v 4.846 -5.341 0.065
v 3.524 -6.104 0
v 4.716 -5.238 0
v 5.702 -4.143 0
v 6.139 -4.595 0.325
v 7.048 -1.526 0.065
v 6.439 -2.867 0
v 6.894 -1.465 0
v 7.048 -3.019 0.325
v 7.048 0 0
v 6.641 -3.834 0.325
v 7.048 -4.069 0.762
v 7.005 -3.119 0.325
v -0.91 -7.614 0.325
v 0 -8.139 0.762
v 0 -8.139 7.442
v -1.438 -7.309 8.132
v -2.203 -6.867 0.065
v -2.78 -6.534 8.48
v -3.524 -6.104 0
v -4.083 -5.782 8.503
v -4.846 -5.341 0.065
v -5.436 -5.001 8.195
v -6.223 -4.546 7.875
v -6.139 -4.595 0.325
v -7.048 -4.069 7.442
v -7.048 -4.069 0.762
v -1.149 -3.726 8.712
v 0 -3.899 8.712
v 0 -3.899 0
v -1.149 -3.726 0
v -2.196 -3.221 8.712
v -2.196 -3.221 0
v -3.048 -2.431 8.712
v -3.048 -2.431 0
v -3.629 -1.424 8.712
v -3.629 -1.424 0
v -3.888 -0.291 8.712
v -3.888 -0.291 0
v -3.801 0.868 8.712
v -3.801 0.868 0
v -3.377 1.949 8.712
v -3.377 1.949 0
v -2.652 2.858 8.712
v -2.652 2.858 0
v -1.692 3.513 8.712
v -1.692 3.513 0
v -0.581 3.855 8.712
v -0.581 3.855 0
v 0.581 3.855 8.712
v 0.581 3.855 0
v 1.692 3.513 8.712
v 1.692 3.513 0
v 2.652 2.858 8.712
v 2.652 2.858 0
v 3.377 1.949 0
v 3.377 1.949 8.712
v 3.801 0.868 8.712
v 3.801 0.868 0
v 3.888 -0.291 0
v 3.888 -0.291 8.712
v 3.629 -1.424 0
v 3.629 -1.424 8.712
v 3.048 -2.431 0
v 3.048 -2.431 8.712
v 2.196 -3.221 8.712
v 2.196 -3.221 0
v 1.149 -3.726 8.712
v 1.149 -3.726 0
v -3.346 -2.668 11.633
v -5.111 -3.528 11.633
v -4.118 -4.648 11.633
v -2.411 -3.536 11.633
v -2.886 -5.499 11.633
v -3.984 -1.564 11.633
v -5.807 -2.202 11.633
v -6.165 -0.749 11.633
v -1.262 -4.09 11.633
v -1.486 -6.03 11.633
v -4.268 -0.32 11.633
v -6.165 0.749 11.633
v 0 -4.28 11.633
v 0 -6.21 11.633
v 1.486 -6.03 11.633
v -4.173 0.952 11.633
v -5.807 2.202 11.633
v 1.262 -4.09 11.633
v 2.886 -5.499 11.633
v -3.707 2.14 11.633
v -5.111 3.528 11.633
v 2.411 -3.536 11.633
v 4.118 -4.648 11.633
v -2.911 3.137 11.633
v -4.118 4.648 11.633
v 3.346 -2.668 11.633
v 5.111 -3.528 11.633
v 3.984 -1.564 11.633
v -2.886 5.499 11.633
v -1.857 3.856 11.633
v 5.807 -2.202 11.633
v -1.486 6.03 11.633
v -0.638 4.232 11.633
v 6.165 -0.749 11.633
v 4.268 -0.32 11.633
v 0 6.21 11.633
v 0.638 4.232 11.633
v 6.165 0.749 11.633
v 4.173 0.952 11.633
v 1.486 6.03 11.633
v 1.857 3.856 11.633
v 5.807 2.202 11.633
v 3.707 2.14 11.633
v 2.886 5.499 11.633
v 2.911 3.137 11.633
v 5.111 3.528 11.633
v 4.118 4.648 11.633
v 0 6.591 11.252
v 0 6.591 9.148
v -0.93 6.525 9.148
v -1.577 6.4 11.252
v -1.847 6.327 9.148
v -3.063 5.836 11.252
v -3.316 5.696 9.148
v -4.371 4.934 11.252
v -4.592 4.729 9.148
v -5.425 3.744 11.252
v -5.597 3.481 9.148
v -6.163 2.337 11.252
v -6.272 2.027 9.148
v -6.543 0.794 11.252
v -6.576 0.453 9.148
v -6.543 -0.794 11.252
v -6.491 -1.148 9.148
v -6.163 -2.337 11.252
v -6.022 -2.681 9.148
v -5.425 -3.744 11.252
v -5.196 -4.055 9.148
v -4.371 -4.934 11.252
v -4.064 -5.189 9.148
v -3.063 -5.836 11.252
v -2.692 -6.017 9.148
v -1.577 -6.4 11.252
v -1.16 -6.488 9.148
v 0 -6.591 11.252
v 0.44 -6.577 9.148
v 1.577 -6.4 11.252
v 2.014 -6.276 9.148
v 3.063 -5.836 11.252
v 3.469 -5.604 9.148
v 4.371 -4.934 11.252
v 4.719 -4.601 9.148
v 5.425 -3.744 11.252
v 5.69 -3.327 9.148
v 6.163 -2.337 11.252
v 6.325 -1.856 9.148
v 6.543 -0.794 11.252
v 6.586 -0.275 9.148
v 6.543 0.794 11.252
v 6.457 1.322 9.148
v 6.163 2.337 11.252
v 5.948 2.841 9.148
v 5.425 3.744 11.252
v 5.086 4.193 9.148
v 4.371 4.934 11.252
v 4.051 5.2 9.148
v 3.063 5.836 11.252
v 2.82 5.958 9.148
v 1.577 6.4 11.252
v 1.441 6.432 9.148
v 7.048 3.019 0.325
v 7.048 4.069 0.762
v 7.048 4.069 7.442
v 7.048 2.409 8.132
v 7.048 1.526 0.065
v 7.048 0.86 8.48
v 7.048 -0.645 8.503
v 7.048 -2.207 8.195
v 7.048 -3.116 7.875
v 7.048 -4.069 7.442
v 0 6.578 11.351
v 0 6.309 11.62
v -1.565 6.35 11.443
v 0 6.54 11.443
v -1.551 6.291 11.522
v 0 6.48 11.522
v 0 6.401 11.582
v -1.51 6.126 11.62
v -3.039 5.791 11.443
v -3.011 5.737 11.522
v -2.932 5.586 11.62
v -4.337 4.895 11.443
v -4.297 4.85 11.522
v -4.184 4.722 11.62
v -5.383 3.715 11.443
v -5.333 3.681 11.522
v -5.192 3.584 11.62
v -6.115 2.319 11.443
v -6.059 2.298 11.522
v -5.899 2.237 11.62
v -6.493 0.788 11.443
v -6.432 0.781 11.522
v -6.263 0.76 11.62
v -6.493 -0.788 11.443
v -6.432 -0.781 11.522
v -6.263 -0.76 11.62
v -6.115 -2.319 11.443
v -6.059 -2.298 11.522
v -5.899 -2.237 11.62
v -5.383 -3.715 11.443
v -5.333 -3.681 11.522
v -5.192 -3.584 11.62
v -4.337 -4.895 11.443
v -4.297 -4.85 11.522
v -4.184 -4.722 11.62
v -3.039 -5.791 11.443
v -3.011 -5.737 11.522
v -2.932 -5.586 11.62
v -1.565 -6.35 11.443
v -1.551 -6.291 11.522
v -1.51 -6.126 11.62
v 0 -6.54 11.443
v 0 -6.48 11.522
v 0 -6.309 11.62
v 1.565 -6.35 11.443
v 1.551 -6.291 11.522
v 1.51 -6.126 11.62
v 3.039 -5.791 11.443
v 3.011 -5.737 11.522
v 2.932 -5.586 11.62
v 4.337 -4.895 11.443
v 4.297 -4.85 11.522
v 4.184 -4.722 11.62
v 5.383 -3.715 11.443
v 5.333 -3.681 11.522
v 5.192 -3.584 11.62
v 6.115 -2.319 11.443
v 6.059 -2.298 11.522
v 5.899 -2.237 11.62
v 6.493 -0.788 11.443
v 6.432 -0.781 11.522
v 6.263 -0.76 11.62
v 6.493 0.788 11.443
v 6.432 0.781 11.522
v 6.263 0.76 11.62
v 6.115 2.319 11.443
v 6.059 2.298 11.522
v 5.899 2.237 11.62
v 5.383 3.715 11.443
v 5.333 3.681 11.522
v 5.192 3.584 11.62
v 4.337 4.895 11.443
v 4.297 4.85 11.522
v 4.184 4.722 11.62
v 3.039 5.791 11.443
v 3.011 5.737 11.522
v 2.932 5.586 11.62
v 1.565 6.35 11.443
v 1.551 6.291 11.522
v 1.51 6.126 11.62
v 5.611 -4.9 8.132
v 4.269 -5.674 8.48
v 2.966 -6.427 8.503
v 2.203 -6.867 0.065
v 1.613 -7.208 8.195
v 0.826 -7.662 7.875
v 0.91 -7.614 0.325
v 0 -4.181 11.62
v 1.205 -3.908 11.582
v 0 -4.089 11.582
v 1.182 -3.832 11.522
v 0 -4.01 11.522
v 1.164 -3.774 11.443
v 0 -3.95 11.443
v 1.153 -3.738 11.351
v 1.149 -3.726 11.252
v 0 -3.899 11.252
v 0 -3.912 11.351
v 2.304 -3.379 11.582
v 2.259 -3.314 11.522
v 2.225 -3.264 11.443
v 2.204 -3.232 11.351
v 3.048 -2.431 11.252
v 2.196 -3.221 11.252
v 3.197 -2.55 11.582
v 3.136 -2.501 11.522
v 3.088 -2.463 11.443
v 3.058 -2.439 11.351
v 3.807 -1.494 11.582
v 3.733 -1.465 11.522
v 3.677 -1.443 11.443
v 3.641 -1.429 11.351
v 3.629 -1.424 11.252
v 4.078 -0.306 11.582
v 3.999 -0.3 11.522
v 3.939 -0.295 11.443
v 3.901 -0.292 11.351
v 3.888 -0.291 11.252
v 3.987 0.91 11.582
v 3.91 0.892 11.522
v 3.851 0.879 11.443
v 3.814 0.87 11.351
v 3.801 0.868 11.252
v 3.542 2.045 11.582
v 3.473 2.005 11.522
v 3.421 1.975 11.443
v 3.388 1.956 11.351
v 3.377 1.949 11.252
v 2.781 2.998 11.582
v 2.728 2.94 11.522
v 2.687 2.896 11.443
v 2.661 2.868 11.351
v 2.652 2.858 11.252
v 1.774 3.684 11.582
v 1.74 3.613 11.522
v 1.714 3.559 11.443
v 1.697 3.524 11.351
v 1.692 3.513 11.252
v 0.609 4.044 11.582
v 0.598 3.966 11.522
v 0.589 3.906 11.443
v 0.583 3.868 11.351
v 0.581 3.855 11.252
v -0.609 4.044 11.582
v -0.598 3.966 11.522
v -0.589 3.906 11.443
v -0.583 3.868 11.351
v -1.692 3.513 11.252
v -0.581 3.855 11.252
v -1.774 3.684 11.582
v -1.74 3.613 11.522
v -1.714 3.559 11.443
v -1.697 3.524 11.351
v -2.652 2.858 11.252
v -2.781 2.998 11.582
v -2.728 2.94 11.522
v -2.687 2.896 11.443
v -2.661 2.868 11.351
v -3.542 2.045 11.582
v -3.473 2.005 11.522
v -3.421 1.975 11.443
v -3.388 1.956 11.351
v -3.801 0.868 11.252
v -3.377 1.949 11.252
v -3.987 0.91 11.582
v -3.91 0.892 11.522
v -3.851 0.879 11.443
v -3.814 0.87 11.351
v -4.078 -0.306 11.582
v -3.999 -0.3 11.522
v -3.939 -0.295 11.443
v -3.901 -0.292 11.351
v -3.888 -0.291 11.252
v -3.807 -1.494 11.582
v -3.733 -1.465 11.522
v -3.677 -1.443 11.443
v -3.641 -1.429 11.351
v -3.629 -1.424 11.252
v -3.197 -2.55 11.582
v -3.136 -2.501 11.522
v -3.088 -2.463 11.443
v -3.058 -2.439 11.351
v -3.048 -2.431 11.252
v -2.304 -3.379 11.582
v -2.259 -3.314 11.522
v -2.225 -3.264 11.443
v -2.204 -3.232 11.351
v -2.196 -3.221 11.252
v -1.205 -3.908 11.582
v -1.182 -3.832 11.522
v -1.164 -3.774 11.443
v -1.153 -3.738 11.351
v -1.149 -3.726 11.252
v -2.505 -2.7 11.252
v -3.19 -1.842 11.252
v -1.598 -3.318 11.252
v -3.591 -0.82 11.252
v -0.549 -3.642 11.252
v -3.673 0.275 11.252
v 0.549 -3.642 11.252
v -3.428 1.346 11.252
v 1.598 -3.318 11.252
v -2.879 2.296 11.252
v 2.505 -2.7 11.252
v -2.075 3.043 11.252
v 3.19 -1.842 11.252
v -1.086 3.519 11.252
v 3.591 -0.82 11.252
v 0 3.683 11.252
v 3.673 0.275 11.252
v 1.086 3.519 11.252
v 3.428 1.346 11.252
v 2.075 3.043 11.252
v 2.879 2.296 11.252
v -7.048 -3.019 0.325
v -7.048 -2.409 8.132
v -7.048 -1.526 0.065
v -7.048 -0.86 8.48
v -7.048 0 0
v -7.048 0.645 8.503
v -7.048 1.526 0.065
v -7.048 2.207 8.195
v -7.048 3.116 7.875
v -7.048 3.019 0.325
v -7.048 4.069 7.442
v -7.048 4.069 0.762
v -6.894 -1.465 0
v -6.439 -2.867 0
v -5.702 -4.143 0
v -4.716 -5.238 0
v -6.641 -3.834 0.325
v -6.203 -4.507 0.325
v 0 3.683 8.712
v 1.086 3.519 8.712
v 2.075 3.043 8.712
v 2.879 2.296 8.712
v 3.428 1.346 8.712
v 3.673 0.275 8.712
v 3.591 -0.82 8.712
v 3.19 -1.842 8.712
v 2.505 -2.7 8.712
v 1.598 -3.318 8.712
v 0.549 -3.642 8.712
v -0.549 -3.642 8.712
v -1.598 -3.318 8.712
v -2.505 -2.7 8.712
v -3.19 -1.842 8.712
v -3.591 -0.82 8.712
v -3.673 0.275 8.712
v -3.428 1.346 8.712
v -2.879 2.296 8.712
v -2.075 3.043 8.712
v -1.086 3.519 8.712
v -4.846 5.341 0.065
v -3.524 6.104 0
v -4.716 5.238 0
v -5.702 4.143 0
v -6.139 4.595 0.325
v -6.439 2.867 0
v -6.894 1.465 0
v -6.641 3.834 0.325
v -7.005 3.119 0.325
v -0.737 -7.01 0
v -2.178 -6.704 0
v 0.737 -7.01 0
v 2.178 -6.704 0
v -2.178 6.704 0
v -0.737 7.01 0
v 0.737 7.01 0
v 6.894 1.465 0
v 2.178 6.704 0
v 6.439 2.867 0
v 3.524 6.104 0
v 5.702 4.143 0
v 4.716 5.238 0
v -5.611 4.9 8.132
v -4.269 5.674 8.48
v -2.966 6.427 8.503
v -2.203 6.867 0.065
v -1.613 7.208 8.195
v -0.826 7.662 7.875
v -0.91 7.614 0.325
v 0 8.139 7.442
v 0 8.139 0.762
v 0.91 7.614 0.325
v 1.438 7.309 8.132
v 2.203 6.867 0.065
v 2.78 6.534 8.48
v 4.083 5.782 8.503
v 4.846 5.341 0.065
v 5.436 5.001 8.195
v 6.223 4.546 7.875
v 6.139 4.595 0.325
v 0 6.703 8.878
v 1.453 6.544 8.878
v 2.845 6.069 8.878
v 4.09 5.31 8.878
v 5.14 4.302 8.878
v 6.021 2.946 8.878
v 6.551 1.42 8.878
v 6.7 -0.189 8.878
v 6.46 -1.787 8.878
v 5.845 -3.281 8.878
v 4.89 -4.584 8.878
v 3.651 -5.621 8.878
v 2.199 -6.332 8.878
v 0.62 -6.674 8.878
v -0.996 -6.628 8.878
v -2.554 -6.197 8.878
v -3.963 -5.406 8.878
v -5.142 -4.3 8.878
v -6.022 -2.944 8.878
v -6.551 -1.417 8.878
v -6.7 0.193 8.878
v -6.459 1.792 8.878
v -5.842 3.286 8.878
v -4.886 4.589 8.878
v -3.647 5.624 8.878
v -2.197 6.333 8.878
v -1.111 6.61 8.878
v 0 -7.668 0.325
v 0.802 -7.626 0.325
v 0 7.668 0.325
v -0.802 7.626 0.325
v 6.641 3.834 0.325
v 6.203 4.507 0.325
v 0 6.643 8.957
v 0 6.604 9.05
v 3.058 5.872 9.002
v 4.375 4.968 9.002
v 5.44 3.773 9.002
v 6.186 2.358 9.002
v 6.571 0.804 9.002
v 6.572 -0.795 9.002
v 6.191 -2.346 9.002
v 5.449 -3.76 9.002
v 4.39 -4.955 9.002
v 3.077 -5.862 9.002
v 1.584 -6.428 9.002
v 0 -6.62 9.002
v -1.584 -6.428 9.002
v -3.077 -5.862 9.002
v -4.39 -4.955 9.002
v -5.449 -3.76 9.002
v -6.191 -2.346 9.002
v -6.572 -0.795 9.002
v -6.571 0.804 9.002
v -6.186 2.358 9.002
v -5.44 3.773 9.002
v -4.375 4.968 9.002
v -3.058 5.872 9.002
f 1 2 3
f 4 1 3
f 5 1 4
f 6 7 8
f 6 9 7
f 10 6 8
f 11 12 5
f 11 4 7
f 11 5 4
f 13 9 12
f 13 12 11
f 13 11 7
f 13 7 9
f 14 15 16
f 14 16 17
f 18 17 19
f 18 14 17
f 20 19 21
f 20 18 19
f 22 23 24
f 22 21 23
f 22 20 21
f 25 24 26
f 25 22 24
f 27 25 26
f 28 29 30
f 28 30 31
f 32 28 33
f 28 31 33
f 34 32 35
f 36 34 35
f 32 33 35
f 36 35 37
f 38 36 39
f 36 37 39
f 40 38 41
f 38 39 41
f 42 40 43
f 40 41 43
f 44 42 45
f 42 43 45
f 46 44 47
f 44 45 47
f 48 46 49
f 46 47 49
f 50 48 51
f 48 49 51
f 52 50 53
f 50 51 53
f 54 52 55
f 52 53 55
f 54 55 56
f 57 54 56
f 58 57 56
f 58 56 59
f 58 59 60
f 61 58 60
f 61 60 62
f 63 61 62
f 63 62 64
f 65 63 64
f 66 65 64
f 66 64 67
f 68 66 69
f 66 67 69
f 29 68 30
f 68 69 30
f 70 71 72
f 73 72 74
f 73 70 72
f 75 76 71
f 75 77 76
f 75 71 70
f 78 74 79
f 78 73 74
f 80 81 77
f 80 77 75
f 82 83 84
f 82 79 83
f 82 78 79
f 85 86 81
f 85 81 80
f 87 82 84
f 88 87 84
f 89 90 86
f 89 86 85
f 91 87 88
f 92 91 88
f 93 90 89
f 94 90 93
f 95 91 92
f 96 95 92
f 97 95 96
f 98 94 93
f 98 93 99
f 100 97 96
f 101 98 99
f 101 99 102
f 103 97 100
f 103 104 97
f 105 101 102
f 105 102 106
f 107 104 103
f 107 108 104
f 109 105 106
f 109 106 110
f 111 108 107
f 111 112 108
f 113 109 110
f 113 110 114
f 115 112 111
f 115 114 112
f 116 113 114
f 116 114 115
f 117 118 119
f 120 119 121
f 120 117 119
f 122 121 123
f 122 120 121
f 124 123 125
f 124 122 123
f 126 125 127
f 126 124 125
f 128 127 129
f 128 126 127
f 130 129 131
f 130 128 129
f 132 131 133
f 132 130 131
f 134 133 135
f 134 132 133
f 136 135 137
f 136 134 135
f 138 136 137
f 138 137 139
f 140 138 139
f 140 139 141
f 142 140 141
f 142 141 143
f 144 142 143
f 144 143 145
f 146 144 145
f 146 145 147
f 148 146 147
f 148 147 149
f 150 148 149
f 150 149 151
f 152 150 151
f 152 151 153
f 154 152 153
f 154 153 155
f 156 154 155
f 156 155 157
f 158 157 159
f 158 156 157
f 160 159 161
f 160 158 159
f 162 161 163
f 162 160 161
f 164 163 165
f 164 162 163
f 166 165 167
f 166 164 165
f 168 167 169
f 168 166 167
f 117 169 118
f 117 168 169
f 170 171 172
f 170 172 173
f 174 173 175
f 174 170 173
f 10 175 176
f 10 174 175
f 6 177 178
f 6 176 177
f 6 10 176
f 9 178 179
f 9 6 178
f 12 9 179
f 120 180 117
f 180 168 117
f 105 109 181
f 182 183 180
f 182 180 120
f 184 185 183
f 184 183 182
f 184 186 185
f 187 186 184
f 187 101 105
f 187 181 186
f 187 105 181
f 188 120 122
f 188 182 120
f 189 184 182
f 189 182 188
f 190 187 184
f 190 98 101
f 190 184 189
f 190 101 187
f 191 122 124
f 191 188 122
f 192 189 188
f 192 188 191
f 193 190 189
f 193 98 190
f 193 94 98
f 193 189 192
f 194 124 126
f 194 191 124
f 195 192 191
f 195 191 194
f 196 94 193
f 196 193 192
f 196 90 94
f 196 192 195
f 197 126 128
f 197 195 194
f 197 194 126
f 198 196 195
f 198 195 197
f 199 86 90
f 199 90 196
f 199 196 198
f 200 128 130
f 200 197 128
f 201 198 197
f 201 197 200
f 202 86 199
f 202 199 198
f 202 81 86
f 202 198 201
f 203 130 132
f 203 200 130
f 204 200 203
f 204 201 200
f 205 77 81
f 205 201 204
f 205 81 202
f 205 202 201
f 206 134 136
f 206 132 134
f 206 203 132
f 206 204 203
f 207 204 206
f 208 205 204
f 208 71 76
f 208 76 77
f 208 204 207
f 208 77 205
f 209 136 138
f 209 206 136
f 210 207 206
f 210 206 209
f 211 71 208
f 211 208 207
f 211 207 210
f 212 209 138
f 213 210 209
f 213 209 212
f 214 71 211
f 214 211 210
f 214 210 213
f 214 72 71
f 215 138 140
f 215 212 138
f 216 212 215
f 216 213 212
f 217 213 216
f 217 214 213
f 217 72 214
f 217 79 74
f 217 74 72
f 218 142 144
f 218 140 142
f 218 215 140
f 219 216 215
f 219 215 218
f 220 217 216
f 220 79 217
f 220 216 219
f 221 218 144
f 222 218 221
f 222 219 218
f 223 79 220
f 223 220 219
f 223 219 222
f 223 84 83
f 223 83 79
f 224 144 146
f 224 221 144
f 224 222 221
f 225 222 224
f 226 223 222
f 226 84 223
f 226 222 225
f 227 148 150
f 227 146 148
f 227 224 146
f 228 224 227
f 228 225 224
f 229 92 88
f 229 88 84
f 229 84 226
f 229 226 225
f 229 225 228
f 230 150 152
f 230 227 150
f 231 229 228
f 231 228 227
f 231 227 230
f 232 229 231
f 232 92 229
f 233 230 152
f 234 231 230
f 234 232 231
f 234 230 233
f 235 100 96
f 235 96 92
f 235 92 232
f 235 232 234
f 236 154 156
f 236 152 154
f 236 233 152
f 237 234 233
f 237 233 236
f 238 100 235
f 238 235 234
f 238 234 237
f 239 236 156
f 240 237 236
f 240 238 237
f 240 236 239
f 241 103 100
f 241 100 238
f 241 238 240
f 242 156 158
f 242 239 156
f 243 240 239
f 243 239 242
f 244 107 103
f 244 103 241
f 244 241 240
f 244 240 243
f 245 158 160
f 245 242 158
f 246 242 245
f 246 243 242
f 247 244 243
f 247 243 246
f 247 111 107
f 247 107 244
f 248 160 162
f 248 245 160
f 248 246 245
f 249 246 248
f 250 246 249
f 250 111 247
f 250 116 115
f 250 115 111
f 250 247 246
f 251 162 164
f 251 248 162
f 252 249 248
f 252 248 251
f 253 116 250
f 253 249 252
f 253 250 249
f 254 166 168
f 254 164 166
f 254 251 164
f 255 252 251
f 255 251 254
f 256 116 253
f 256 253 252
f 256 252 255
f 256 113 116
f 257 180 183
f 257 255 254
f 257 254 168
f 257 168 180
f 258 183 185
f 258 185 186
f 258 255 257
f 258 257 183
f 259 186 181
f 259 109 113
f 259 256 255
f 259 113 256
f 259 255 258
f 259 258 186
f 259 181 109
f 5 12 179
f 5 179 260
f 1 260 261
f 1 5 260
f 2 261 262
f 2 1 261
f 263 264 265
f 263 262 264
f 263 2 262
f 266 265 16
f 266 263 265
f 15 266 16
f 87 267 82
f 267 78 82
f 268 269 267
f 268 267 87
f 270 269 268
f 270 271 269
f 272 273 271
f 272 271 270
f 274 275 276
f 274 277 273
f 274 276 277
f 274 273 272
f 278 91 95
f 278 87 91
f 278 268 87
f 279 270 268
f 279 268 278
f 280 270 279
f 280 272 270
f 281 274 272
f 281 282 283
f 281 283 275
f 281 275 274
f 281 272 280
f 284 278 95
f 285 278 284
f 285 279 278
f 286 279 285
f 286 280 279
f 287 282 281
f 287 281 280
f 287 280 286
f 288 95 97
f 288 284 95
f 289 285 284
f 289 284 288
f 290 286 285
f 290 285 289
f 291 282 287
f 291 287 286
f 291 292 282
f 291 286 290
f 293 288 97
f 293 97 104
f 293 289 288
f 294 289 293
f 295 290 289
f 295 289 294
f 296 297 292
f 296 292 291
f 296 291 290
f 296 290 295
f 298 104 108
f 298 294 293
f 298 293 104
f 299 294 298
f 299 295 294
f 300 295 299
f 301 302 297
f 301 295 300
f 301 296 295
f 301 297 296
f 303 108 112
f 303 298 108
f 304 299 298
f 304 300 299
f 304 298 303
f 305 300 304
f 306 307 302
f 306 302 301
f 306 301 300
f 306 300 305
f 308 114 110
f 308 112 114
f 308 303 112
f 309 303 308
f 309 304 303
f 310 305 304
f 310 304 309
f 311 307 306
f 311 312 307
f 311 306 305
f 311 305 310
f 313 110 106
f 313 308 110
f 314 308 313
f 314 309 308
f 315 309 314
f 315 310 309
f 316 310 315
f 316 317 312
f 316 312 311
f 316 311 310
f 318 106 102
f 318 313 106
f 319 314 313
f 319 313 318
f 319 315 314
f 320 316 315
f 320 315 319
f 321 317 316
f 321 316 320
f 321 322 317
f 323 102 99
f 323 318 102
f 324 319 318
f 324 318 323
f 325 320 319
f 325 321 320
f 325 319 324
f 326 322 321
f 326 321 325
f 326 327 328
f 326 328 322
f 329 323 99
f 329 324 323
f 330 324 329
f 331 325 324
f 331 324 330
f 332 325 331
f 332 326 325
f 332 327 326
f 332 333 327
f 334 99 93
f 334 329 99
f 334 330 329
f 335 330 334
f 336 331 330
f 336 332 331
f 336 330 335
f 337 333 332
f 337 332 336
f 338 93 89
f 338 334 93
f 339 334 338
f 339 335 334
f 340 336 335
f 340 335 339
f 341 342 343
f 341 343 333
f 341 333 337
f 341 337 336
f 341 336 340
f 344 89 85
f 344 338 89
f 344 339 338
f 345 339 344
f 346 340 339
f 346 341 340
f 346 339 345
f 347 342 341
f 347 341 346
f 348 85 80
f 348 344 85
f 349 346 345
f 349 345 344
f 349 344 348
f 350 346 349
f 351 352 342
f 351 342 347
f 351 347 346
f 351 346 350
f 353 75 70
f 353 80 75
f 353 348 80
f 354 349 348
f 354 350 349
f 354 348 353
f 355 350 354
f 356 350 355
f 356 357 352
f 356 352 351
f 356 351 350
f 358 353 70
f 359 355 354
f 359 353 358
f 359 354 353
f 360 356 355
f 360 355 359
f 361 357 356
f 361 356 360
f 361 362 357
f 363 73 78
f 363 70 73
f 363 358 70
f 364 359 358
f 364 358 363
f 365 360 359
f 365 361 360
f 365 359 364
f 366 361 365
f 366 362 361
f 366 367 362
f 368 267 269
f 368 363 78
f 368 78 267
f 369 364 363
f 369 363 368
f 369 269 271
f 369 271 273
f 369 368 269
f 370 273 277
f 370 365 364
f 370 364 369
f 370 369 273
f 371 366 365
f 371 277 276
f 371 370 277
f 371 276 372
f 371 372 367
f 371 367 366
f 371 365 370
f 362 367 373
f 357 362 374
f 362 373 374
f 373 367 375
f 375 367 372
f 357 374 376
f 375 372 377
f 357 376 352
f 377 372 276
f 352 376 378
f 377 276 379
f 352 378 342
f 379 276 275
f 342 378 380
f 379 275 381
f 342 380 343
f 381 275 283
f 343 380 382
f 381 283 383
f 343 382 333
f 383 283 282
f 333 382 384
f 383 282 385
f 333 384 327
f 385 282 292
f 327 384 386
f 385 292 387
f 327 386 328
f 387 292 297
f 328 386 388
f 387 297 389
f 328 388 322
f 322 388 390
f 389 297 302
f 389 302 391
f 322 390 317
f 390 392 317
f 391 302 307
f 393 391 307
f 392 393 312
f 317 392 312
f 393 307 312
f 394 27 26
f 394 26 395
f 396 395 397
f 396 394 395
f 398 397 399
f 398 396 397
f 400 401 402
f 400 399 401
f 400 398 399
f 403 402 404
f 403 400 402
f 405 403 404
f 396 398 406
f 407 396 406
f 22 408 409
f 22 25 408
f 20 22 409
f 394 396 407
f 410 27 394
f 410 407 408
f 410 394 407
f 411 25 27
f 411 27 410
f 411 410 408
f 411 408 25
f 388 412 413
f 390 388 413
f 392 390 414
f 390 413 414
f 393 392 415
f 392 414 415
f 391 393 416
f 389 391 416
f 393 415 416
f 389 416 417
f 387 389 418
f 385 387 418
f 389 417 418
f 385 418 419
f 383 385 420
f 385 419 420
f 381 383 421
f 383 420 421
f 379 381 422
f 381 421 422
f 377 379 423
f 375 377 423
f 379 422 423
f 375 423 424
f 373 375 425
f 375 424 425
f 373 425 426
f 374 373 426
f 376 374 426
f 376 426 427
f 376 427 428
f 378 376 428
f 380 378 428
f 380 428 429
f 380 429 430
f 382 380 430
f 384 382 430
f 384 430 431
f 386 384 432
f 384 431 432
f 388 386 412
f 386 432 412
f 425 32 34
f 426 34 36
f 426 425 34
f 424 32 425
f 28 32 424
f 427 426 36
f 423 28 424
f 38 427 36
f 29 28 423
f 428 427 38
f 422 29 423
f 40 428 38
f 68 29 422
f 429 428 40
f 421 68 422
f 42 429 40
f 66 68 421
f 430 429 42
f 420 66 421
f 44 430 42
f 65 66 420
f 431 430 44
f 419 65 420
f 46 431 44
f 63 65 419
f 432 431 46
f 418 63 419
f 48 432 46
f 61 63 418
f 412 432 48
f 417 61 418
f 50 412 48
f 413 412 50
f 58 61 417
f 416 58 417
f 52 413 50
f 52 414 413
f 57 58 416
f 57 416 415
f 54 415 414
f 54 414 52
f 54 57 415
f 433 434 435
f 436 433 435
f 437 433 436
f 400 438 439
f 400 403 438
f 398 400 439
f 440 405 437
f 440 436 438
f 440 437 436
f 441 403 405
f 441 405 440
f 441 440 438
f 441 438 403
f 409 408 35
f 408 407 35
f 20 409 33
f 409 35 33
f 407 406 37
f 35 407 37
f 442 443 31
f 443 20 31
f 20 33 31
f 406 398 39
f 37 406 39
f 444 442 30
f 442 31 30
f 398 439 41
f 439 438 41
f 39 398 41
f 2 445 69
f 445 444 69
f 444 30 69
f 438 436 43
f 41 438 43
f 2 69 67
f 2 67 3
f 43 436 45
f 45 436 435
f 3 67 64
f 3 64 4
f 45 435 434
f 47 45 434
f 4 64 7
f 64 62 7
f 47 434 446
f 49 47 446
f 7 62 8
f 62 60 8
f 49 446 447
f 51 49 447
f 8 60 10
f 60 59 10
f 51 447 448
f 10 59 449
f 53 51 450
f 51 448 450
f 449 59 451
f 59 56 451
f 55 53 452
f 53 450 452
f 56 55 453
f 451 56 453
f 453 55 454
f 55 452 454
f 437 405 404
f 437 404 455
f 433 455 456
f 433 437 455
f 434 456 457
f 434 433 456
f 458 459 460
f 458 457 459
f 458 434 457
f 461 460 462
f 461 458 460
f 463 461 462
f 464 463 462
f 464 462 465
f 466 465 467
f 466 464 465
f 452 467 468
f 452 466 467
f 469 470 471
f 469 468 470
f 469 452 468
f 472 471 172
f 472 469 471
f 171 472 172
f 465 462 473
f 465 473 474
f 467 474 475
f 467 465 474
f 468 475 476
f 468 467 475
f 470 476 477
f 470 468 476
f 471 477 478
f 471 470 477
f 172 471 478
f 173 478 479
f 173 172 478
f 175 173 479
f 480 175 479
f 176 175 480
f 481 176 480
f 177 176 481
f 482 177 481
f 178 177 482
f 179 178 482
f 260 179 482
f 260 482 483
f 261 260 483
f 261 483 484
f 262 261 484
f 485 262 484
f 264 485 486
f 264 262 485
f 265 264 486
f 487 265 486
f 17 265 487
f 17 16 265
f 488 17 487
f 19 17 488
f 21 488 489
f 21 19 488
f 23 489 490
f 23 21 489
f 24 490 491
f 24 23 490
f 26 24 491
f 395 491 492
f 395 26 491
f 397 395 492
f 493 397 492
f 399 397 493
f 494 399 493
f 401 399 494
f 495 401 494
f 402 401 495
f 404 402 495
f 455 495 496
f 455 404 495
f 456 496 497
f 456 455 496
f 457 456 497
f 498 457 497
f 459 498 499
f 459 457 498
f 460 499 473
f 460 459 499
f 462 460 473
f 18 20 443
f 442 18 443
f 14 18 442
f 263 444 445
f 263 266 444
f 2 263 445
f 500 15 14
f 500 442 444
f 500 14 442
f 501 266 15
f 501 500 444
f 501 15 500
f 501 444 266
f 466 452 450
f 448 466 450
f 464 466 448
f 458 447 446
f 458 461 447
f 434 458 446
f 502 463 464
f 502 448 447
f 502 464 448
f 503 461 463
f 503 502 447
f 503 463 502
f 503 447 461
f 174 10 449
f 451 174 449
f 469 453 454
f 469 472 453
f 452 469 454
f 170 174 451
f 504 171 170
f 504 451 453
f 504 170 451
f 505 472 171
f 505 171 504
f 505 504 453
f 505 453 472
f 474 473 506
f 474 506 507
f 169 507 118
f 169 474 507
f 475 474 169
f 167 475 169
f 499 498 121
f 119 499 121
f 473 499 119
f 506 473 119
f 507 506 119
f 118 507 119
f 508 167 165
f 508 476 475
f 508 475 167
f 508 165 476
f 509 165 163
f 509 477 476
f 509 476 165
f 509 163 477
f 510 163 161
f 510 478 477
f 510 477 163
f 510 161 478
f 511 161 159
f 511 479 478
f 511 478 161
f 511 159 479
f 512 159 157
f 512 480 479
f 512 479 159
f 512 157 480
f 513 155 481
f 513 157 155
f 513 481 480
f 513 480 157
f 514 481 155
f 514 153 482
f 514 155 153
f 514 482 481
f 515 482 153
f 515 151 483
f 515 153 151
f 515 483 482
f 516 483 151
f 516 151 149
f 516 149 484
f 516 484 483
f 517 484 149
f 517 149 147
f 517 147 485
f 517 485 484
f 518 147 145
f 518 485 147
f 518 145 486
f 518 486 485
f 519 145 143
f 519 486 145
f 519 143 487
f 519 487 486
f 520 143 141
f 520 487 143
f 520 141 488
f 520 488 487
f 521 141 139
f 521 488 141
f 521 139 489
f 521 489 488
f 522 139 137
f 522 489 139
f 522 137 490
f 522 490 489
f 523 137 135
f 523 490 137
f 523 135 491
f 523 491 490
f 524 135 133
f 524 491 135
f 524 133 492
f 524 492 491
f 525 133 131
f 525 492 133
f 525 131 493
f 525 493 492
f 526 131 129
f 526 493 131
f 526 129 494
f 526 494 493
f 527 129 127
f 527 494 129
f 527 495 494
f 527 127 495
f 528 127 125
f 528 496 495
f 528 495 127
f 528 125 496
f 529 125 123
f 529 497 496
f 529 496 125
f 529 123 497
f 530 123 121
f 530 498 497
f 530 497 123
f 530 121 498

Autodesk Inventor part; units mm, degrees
ref_plane "YZ Plane" through (0, 0, 0) normal (1, 0, 0) x (0, 1, 0)
ref_plane "XZ Plane" through (0, 0, 0) normal (0, 1, 0) x (-1, 0, 0)
ref_plane "XY Plane" through (0, 0, 0) normal (0, 0, 1) x (1, 0, 0)
sketch "Sketch1" plane through (0, 0, 0) normal (0, 0, 1) x (1, 0, 0)
  line L0 (0, 8.1389) -> (7.0485, 4.0695)
  line L1 (7.0485, 4.0695) -> (7.0485, -4.0695)
  line L2 (7.0485, -4.0695) -> (0, -8.1389)
  line L3 (0, -8.1389) -> (-7.0485, -4.0695)
  line L4 (-7.0485, -4.0695) -> (-7.0485, 4.0695)
  line L5 (-7.0485, 4.0695) -> (0, 8.1389)
  line L6 (0, 11.3945) -> (0, -11.3945) projected
  line L7 (-9.8679, 0) -> (9.8679, 0) projected
  point P0 (0, 0)
  dimension "d0" = 14.097
extrude "Extrusion1" add sketch "Sketch1" along normal blind 11.6332
sketch "Sketch2" plane through (0, 0, 0) normal (1, 0, 0) x (0, 1, 0)
  line L0 (8.1389, 0) -> (8.1389, 11.6332) projected
  line L1 (4.0695, 11.6332) -> (-4.0695, 11.6332) projected
  line L2 (8.1389, 11.6332) -> (4.0695, 11.6332) projected
  line L3 (4.0695, 11.6332) -> (8.1389, 11.6332) projected
  line L4 (-4.0695, 11.6332) -> (4.0695, 11.6332) projected
  line L5 (-8.1389, 11.6332) -> (-4.0695, 11.6332) projected
  line L6 (-4.0695, 11.6332) -> (-8.1389, 11.6332) projected
  line L7 (8.1389, 7.4422) -> (6.5913, 8.9898)
  line L8 (6.5913, 8.9898) -> (6.5913, 11.6332)
  line L9 (8.1389, 11.6332) -> (8.1389, 7.4422)
  line L10 (6.223, 11.2522) -> (3.683, 11.2522)
  line L11 (3.683, 11.2522) -> (3.683, 8.7122)
  line L12 (3.683, 8.7122) -> (6.223, 8.7122)
  line L13 (6.223, 8.7122) -> (6.223, 11.2522)
  line L14 (0, 18.0282) -> (0, -3.0895) projected
  arc A0 (7.0485, 0) -> (8.1389, 0.762) centre (6.1895, 2.3903) ccw
  line L15 (8.1389, 0) -> (4.0695, 0) projected
  line L16 (7.0485, 0) -> (8.1389, 0)
  line L17 (8.1389, 0.762) -> (8.1389, 0)
  dimension "d3" = 4.191
  dimension "d4" = 45
  dimension "d5" = 6.5913
  dimension "d6" = 3.683
  dimension "d7" = 0.381
  dimension "d8" = 2.54
  dimension "d9" = 2.54
  dimension "d11" = 7.0485
  dimension "d12" = 0.762
  dimension "d13" = 2.54
revolve "Revolution1" cut sketch "Sketch2" angle 360 about axis through (0, 0, 0) along (0, 0, -1) contours L7 L8 L2 L0
revolve "Revolution2" cut sketch "Sketch2" angle 360 about axis through (0, 0, 0) along (0, 0, -1) contours L15 A0 L0
hole "Hole1" at (0, 0, 11.6332) direction (0, 0, -1) diameter 7.7978 end through all thread size "3/8-16 UNC" class "2B" standard "ANSI Unified Screw Threads"
fillet "Fillet1" radius 0.381 3 edges at (0, -6.5913, 8.9898) (0, -6.5913, 11.6332) (0, 3.8989, 11.6332)
revolve "Revolution3" add sketch "Sketch2" angle 360 about axis through (0, 0, 0) along (0, 0, -1) contours L13 L12 L11 L10
properties part number "HW-00026" material "Steel"
